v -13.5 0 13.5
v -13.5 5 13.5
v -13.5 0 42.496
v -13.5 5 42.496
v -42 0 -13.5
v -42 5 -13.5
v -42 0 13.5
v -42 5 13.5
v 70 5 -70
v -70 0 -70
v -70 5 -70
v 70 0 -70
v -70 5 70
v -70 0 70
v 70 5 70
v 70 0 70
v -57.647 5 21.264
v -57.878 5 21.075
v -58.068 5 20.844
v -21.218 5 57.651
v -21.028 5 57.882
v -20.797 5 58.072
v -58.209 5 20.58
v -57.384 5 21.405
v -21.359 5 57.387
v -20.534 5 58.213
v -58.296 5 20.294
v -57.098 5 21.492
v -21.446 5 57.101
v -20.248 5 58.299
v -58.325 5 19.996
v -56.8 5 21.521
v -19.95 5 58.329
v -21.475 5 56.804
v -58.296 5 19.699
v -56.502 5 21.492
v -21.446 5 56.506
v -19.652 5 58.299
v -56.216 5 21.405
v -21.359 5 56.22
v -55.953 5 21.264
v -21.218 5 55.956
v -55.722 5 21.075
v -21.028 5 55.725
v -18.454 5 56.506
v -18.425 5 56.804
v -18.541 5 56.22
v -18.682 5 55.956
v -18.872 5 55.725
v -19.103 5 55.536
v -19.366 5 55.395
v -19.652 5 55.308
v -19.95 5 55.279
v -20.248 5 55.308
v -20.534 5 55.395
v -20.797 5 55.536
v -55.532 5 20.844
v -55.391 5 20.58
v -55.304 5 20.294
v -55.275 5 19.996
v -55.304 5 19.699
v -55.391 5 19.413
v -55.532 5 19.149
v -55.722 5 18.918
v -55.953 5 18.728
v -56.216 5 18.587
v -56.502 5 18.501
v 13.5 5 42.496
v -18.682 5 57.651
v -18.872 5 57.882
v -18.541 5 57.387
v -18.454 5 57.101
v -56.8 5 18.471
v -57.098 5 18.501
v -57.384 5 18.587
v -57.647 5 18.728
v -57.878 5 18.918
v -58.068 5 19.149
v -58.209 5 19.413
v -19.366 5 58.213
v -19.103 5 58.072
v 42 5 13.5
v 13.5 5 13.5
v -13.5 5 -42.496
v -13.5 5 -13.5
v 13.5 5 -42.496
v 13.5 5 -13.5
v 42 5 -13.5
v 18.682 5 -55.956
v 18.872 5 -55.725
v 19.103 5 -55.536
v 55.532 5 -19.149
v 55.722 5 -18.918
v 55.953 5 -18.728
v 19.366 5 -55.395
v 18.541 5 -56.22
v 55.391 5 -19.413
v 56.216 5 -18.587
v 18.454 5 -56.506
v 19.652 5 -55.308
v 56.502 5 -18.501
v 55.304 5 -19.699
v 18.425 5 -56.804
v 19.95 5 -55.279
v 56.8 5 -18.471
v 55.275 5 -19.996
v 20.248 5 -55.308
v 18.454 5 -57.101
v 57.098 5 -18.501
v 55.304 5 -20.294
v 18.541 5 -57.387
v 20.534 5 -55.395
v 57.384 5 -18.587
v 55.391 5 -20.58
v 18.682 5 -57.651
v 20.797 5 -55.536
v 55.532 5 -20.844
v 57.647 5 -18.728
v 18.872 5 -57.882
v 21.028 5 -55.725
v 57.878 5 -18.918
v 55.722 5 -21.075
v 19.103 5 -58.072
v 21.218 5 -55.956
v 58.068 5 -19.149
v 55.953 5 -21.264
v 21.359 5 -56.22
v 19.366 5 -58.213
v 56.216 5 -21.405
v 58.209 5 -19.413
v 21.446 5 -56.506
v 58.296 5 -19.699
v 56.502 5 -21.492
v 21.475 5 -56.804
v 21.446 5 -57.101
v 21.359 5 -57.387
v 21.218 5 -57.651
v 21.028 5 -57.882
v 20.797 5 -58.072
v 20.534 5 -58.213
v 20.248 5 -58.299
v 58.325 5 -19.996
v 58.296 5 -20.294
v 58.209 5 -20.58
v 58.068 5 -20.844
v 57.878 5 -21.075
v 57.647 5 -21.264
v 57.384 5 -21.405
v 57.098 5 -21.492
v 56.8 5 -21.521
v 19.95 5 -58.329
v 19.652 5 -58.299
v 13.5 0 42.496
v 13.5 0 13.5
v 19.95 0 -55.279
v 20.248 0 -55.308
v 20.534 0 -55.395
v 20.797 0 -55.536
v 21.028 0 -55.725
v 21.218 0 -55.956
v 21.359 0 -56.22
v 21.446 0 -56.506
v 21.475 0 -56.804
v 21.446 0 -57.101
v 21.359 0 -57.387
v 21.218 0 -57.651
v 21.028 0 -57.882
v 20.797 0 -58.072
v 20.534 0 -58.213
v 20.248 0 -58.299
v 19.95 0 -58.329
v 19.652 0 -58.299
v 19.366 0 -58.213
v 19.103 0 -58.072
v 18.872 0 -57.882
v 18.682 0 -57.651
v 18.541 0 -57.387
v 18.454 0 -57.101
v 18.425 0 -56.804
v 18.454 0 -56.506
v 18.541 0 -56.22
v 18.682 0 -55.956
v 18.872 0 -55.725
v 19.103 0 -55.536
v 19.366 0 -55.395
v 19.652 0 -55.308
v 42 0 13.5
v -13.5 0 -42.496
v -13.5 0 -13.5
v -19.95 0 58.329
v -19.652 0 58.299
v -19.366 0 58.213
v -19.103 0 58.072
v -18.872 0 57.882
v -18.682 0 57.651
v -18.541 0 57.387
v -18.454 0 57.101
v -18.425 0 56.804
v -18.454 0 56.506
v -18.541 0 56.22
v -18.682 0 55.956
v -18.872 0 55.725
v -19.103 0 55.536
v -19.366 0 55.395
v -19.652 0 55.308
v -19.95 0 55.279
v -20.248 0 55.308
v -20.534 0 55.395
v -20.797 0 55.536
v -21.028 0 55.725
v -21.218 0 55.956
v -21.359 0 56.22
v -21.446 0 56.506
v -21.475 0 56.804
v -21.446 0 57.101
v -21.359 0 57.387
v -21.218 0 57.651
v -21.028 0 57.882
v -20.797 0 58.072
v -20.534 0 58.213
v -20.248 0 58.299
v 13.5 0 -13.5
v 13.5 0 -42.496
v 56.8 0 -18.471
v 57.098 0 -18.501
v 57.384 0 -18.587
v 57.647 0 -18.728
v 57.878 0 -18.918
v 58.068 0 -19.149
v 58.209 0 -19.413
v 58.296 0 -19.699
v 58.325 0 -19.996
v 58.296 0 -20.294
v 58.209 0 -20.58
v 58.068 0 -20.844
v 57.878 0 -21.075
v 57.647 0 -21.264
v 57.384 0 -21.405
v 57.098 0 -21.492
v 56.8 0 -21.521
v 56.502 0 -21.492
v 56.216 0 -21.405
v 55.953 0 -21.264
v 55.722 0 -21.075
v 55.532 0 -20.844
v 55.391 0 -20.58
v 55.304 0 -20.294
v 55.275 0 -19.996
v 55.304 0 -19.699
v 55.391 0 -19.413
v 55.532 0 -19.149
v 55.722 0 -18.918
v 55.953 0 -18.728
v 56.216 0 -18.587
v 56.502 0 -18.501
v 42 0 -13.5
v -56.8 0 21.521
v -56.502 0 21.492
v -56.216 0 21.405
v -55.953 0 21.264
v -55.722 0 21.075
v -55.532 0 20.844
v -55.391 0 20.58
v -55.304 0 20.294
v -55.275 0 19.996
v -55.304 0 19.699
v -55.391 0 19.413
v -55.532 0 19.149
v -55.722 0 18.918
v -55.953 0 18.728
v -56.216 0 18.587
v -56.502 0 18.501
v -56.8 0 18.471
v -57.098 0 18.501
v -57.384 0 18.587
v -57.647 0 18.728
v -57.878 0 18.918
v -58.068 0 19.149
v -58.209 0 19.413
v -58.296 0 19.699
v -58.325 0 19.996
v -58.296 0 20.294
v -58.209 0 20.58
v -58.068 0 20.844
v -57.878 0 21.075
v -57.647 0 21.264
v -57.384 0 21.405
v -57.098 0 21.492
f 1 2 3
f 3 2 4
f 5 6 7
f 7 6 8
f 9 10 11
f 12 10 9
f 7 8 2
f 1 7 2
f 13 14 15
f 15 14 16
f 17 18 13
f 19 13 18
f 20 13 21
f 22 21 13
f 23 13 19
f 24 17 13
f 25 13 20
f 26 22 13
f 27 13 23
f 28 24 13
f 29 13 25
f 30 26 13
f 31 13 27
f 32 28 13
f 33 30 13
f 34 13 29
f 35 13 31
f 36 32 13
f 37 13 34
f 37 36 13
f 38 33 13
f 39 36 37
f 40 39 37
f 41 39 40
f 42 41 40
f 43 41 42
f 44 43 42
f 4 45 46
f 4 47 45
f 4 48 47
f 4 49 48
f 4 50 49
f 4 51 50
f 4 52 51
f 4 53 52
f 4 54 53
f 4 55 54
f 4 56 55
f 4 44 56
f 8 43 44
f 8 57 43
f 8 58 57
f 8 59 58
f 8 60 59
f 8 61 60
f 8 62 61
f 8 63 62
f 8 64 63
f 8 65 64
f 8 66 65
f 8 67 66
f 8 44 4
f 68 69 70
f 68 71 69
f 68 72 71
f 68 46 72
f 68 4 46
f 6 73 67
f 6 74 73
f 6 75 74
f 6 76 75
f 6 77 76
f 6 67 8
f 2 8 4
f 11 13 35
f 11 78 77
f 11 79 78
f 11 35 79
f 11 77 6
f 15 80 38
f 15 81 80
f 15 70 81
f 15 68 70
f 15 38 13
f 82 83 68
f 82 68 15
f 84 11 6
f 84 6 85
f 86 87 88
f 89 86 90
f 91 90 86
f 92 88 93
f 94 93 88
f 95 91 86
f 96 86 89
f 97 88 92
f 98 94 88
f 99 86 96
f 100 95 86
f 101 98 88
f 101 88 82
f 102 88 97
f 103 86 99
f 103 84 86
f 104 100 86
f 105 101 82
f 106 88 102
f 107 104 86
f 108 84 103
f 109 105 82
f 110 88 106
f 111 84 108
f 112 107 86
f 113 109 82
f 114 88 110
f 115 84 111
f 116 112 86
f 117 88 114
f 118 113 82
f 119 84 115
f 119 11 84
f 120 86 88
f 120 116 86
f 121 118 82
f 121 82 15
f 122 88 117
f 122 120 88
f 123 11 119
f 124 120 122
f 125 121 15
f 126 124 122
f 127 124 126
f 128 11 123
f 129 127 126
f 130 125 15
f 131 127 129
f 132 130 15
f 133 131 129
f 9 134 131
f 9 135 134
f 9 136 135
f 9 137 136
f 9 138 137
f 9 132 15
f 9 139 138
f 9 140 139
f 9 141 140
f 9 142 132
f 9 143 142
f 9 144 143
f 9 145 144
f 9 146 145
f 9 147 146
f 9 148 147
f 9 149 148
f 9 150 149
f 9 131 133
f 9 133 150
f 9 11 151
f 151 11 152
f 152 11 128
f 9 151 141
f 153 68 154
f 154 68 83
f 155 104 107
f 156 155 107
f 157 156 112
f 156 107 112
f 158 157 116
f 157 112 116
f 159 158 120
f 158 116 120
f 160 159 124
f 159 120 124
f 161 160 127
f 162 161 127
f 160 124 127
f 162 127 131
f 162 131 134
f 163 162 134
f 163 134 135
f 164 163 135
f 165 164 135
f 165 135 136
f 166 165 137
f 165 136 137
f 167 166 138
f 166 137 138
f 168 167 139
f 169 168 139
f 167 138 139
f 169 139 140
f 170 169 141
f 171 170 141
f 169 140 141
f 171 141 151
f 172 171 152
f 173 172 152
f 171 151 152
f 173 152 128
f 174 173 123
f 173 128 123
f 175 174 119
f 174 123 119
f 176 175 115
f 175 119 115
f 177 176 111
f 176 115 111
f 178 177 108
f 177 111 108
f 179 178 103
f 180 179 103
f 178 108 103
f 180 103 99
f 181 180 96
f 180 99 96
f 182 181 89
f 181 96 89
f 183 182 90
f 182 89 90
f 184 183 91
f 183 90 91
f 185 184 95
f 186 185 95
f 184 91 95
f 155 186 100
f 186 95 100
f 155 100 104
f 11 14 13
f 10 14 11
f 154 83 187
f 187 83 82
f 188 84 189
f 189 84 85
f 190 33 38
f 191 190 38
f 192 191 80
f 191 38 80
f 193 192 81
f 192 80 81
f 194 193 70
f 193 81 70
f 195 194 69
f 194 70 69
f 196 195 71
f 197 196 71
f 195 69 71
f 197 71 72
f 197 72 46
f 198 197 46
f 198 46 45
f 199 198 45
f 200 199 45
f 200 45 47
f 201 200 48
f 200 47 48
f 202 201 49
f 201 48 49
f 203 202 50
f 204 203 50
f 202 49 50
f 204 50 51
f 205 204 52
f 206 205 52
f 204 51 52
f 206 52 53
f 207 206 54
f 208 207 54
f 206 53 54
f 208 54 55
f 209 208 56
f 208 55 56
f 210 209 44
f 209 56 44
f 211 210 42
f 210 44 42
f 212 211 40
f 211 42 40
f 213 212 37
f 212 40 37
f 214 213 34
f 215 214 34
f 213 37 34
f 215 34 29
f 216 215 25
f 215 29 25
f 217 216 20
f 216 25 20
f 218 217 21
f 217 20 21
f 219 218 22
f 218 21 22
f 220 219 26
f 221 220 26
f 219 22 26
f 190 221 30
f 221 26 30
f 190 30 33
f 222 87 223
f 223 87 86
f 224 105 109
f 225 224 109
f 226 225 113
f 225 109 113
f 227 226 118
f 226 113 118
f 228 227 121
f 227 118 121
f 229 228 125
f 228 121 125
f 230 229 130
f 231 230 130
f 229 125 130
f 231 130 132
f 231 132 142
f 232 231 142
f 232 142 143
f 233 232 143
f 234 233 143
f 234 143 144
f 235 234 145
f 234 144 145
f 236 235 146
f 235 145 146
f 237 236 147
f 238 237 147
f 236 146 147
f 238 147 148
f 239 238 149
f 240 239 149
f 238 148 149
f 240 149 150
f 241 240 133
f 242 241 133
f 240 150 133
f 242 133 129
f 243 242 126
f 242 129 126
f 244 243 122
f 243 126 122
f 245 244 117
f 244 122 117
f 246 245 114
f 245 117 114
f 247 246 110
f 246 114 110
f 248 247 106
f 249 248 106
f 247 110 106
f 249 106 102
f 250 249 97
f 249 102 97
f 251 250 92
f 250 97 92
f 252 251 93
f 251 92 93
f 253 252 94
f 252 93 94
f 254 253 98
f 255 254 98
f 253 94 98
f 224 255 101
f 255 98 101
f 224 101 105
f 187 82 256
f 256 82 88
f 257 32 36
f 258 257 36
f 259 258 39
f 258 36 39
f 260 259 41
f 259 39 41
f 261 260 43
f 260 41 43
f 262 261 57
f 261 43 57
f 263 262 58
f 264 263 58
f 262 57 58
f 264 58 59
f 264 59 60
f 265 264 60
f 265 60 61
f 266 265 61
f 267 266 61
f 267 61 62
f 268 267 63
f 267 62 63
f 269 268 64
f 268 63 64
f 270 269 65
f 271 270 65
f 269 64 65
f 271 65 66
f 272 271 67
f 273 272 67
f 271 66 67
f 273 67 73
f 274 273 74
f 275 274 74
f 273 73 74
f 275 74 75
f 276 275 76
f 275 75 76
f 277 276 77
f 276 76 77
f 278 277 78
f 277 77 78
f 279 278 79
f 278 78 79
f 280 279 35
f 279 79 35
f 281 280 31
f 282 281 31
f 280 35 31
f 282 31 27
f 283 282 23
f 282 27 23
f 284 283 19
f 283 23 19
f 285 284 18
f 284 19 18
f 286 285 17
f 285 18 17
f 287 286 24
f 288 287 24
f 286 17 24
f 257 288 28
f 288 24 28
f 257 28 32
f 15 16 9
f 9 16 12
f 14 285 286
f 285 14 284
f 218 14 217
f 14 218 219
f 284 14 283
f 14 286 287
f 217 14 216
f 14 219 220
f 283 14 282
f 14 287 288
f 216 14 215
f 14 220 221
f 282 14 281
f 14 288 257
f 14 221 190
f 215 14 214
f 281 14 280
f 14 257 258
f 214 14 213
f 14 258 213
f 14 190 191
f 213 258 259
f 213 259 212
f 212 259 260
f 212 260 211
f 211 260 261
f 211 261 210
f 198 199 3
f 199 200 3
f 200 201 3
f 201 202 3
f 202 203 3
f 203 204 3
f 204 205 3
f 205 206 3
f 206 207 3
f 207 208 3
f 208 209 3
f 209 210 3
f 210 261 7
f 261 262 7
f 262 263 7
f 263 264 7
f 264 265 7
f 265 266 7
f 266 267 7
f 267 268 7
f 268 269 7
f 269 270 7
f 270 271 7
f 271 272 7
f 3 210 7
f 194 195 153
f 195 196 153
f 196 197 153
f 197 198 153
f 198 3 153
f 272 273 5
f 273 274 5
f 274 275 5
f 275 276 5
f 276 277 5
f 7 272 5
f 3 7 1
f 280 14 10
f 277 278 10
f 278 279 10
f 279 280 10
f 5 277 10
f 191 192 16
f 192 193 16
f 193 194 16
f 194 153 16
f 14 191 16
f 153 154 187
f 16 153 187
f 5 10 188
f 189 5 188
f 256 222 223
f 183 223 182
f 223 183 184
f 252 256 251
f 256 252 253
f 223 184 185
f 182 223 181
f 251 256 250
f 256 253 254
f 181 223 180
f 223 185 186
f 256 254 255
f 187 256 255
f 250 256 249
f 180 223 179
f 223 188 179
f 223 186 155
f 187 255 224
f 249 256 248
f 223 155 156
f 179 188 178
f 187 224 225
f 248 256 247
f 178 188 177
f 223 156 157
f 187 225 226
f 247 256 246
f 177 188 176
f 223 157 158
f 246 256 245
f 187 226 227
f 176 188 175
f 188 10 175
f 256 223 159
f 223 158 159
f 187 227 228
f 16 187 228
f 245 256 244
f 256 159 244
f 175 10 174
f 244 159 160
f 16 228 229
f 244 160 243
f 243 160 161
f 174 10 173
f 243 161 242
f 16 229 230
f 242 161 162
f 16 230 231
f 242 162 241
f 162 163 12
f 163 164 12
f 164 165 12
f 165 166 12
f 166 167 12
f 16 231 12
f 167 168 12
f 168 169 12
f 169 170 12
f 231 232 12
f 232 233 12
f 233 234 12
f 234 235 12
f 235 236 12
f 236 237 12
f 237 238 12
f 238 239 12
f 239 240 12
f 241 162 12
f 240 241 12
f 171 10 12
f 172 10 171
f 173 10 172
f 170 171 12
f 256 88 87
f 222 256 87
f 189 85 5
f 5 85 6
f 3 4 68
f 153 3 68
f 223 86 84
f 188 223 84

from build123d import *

# Parameters (mm, degrees)
SKETCH1_W           = 140
SKETCH1_H           = 140
BOSS_EXTRUDE1_DEPTH = 5
CUT_EXTRUDE2_DEPTH  = 5
SKETCH3_W           = 26
SKETCH3_H           = 26
CUT_EXTRUDE3_DEPTH  = 5
SKETCH5_R           = 1.525
CUT_EXTRUDE5_DEPTH  = 5
SKETCH7_W           = 0.499998827
SKETCH7_H           = 0.5
SKETCH7_W_2         = 0.5
CUT_EXTRUDE6_DEPTH  = 5


with BuildPart() as part:
    # Sketch1 → Boss-Extrude1 (new body)
    with BuildSketch(Plane(origin=(0, 0, 0), x_dir=(1, 0, 0), z_dir=(0, 1, 0))):
        Rectangle(SKETCH1_W, SKETCH1_H)
    extrude(amount=BOSS_EXTRUDE1_DEPTH)

    # Sketch2 → Cut-Extrude2 (cut)
    with BuildSketch(Plane(origin=(0, 5, 0), x_dir=(1, 0, 0), z_dir=(0, 1, 0))):
        Polygon((-13, 13), (13, 13), (13, 13.5), (13.5, 13.5), (13.5, 42.495538118), (-13.499998827, 42.495538118), (-13.499998827, 13.5), (-13, 13.5), align=None)
        Polygon((-13.499998827, -13), (-13, -13), (-13, 13), (-13.499998827, 13), (-13.499998827, 13.5), (-42, 13.5), (-42, -13.5), (-13.499998827, -13.5), align=None)
        Polygon((13, 13), (13, -13), (13.5, -13), (13.5, -13.5), (42, -13.5), (42, 13.5), (13.5, 13.5), (13.5, 13), align=None)
        Polygon((13.5, -13.5), (13, -13.5), (13, -13), (-13, -13), (-13, -13.5), (-13.499998827, -13.5), (-13.499998827, -42.495538118), (13.5, -42.495538118), align=None)
    extrude(amount=-CUT_EXTRUDE2_DEPTH, mode=Mode.SUBTRACT)

    # Sketch3 → Cut-Extrude3 (cut)
    with BuildSketch(Plane(origin=(0, 5, 0), x_dir=(1, 0, 0), z_dir=(0, 1, 0))):
        Rectangle(SKETCH3_W, SKETCH3_H)
    extrude(amount=-CUT_EXTRUDE3_DEPTH, mode=Mode.SUBTRACT)

    # Sketch5 → Cut-Extrude5 (cut)
    with BuildSketch(Plane(origin=(0, 5, 0), x_dir=(1, 0, 0), z_dir=(0, 1, 0))):
        with Locations(Location((-56.8, -19.996300578, 0), (0, 0, 270))):
            Circle(SKETCH5_R)
        with Locations(Location((-19.95, -56.803699422, 0), (0, 0, 270))):
            Circle(SKETCH5_R)
        with Locations(Location((19.95, 56.803699422, 0), (0, 0, 270))):
            Circle(SKETCH5_R)
        with Locations(Location((56.8, 19.996300578, 0), (0, 0, 270))):
            Circle(SKETCH5_R)
    extrude(amount=-CUT_EXTRUDE5_DEPTH, mode=Mode.SUBTRACT)

    # Sketch7 → Cut-Extrude6 (cut)
    with BuildSketch(Plane(origin=(0, 5, 0), x_dir=(1, 0, 0), z_dir=(0, 1, 0))):
        with Locations((-13.249999413, -13.25)):
            Rectangle(SKETCH7_W, SKETCH7_H)
        with Locations((-13.249999413, 13.25)):
            Rectangle(SKETCH7_W, SKETCH7_H)
        with Locations((13.25, 13.25)):
            Rectangle(SKETCH7_W_2, SKETCH7_H)
        with Locations((13.25, -13.25)):
            Rectangle(SKETCH7_W_2, SKETCH7_H)
    extrude(amount=-CUT_EXTRUDE6_DEPTH, mode=Mode.SUBTRACT)


solid = part.part
